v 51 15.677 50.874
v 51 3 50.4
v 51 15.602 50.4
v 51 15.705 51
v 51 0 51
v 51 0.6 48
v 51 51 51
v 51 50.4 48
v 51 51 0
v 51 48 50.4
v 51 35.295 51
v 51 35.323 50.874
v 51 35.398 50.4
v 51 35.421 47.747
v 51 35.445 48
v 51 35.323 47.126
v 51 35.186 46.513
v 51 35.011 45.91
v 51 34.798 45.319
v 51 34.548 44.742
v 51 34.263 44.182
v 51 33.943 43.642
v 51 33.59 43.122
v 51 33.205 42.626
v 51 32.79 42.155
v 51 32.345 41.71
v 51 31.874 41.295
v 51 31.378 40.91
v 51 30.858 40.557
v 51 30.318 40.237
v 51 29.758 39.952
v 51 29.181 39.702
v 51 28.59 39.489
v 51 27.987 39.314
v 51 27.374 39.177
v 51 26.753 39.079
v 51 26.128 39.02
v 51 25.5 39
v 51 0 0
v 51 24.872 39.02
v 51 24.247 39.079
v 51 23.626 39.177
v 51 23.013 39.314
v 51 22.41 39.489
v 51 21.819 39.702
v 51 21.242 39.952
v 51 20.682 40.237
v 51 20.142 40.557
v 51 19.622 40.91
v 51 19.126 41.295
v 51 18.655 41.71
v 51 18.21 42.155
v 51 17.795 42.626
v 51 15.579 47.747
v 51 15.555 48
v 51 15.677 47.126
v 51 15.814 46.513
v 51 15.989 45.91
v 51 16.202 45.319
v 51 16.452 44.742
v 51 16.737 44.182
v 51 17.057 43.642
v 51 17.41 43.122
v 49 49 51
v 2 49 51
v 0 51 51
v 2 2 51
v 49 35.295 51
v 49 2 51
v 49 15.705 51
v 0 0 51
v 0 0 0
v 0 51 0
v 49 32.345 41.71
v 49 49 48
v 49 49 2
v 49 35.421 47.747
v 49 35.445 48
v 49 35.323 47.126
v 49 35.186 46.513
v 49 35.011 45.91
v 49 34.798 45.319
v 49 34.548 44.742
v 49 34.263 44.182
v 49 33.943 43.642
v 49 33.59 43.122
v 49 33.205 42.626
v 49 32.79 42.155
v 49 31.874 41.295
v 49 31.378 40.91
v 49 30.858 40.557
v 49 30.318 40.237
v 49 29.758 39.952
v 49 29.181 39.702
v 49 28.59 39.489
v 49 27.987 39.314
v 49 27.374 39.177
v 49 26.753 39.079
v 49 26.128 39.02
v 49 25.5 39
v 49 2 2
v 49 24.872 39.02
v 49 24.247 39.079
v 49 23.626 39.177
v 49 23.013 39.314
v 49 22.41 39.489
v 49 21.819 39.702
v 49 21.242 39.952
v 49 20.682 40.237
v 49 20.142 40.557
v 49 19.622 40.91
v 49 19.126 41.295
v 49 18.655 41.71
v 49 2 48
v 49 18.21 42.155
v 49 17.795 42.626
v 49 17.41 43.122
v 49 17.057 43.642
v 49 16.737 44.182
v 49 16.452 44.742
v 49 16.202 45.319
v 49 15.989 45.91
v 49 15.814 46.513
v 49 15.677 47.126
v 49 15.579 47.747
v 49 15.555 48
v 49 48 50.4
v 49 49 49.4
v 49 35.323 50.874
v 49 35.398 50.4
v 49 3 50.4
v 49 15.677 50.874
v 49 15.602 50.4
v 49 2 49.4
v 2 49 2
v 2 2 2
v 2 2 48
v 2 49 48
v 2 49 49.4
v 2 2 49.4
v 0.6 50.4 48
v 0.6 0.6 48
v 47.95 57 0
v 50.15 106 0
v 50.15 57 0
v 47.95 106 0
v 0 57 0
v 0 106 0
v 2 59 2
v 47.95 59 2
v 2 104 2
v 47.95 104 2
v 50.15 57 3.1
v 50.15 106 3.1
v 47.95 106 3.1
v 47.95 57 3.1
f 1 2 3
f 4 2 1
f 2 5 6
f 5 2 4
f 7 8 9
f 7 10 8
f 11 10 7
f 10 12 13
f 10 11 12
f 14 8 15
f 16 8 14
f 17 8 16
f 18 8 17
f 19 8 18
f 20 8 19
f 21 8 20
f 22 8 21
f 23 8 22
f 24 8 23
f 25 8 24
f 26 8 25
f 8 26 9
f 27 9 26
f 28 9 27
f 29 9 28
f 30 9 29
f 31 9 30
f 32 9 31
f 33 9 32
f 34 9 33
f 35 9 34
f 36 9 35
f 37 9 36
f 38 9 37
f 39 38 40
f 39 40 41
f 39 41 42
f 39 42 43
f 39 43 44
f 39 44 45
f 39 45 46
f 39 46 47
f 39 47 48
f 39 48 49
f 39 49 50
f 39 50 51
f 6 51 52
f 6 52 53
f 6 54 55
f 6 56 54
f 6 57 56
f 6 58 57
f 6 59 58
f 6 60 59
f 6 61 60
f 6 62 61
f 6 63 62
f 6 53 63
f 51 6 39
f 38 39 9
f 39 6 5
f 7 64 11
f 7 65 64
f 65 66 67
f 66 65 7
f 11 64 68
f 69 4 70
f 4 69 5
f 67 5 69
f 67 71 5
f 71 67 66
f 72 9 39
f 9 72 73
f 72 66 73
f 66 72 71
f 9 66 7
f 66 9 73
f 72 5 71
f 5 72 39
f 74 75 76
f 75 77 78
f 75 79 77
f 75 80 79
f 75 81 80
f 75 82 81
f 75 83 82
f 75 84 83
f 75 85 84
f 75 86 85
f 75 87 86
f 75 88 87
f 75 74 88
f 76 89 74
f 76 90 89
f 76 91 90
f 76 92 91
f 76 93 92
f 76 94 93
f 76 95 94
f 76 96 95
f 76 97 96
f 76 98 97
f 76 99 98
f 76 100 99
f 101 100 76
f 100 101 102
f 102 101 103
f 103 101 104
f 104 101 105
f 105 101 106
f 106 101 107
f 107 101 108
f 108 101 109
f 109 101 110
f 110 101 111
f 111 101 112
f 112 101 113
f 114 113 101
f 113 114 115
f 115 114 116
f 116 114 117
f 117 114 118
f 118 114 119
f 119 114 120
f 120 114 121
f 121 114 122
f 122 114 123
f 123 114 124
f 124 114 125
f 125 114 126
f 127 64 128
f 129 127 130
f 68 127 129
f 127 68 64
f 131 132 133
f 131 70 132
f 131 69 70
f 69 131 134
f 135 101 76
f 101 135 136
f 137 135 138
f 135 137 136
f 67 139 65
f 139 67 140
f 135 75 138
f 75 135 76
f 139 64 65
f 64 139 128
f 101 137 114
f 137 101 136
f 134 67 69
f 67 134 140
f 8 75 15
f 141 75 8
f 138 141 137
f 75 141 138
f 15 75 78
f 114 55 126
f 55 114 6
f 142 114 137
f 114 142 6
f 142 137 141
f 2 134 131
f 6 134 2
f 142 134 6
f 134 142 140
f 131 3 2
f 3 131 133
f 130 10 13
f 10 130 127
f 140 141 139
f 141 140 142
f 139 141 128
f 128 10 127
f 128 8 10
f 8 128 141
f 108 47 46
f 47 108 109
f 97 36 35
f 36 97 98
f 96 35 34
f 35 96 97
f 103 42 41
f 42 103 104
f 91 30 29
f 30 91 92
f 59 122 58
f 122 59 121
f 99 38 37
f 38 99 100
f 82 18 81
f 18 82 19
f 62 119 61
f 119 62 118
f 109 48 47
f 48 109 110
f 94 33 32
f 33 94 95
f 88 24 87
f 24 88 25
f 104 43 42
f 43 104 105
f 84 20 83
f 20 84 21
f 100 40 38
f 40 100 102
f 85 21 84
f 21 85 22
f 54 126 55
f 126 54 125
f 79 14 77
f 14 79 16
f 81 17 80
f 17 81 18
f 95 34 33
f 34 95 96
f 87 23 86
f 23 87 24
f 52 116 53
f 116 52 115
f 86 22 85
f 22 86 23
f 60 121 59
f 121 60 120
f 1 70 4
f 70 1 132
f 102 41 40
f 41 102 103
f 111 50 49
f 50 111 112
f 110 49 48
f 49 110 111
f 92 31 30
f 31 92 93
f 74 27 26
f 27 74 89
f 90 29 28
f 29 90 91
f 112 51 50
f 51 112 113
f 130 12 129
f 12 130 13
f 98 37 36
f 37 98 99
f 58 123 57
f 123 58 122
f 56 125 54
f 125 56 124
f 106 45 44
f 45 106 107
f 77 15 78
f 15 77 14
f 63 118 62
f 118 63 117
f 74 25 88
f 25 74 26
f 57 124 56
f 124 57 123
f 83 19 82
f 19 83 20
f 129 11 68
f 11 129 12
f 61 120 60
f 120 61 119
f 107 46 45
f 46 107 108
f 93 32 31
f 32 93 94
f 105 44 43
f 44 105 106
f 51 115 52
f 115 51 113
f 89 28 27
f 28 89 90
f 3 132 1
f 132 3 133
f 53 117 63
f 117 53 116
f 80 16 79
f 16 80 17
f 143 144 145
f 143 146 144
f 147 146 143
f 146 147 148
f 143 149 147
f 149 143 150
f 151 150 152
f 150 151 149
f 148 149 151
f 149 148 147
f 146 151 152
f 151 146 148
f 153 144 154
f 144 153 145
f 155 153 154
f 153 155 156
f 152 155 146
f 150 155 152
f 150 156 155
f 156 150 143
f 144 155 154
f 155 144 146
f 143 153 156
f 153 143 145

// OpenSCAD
// file: carcassonne_box.scad
/**
 * @file carcassonne_box.scad
 * @author Conlan Wesson (modified by [Your Name])
 * Template for Carcassonne boxes.
 * @copyright Creative Commons Attribution-NonCommercial-ShareAlike 4.0
 */

mm = 1;
cm = 10*mm;

width = 47*mm;
thick = 2.5*mm;
wall = 2*mm;

/**
 * Lid for box.
 * @param sections Array of section lengths.
 * @param columns Number of columns.
 * @param icon Path to icon DXF file.
 * @param rot Icon rotation in degrees.
 * @param mult Icon scale.
 * @param xoff X-offset of icon from center.
 * @param yoff Y-offset of icon from center.
 */
module carcassonne_lid(sections, columns=1, icon=false, icon2=false, icon3=false, rot=0, mult=1, xoff=0, yoff=0, mult2=1, xoff2=0, yoff2=0, mult3=1, xoff3=0, yoff3=0, g=0){
    length = sum(sections) + ((width/2) - (sum(sections) % (width/2)));
    w = length+(1.5*wall)+.1;
    l = (width*columns)+wall;
    h = wall;
    d = 2;

    CubePoints = [
        [ 0-g, 0-g,   0 ],  //0
        [ w+g, 0-g,   0 ],  //1
        [ w+g, l+g,   0 ],  //2
        [ 0-g, l+g,   0 ],  //3
        [   d,   d, h+g ],  //4
        [   w,   d, h+g ],  //5
        [   w, l-d, h+g ],  //6
        [   d, l-d, h+g ]   //7
    ];
    
    CubeFaces = [
        [0,1,2,3],  // bottom
        [4,5,1,0],  // front
        [7,6,5,4],  // top
        [5,6,2,1],  // right
        [6,7,3,2],  // back
        [7,4,0,3]   // left
    ];
    
    difference(){
        union(){
            polyhedron( CubePoints, CubeFaces );
            translate([w-wall-.15,0,0]) cube([wall+.2,l, (1.5*wall)+.1]);
        }
        if(icon){
            translate([w/2+xoff,l/3+yoff,h-(wall/2)]){
                linear_extrude(height=(wall)+.1){
                    rotate(rot) scale(mult) import(icon);
                }
            }
        }
        if(icon2){
            translate([w/2+xoff2,l/3+yoff2,h-(wall/2)]){
                linear_extrude(height=(wall)+.1){
                    rotate(rot) scale(mult2) import(icon2);
                }
            }
        }
        if(icon3){
            translate([w/2+xoff3,l/3+yoff3,h-(wall/2)]){
                linear_extrude(height=(wall)+.1){
                    rotate(rot) scale(mult3) import(icon3);
                }
            }
        }
    }
}

/**
 * Carcassonne card box.
 * @param sections Array of section lengths.
 * @param columns Number of columns.
 */
module carcassonne_box(sections, columns=1){
    raw_length = sum(sections);
    extra_space = ((width/2) - (raw_length % (width/2))) % (width/2);
    length = raw_length + extra_space;
    
    section_count = len(sections);
    adjusted_sections = [for (i = [0:section_count-1]) 
        sections[i] + (extra_space / section_count)];
    
    difference(){
        union(){
            difference(){
                // Outer walls
                cube([length+(2*wall), (width*columns)+(2*wall), width+(2*wall)]);
                // Cavity
                translate([wall, wall, wall]){
                    cube([length, width*columns, (width+wall)+.1]);
                }
            }
            // Dividers
            for(col = [0:columns-1]){
                divider_positions = [for(i=0; i<len(adjusted_sections)-1; i=i+1) 
                    sum([for(j=[0:i]) adjusted_sections[j]])];
                for(pos = divider_positions){
                    translate([pos+wall, width*col+wall, 0]) 
                        cube([wall/2, width, width-(2*wall)]);
                }
                if(col > 0){
                    translate([0, width*col+(wall/2), 0]) 
                        cube([length+(2*wall)-18.0, wall/2, width-(2*wall)]);
                }
            }
        }
        union(){
            // Notch
            for(col = [0:columns-1]){
                translate([wall, wall+(width*col), wall]){
                    translate([0, width/2, width])
                    rotate([0, 90, 0]){
                        cylinder(r=10, h=length+(2*wall), $fn=100);
                    }
                }
            }
            // Track
            translate([wall/2,wall/2,width+wall/2]) 
                carcassonne_lid(adjusted_sections, columns, g=0.4);
        }
    }
}

// Helper function to sum an array
function sum(v, i = 0, r = 0) = i < len(v) ? sum(v, i + 1, r + v[i]) : r;
// main file
/**
 * @file sping.scad
 * Four Seasons - Spring Carcassonne box.
 */

include <carcassonne_box.scad>

mm = 1;
tiles = 2*mm;

sections = [12 * tiles];
columns = 1;
icon = "0-spring.dxf";

carcassonne_box(sections, columns);
translate([0,width*columns+10,0]) carcassonne_lid(sections, columns, icon, rot=90, mult=2.2, xoff=21, yoff=-9); 
